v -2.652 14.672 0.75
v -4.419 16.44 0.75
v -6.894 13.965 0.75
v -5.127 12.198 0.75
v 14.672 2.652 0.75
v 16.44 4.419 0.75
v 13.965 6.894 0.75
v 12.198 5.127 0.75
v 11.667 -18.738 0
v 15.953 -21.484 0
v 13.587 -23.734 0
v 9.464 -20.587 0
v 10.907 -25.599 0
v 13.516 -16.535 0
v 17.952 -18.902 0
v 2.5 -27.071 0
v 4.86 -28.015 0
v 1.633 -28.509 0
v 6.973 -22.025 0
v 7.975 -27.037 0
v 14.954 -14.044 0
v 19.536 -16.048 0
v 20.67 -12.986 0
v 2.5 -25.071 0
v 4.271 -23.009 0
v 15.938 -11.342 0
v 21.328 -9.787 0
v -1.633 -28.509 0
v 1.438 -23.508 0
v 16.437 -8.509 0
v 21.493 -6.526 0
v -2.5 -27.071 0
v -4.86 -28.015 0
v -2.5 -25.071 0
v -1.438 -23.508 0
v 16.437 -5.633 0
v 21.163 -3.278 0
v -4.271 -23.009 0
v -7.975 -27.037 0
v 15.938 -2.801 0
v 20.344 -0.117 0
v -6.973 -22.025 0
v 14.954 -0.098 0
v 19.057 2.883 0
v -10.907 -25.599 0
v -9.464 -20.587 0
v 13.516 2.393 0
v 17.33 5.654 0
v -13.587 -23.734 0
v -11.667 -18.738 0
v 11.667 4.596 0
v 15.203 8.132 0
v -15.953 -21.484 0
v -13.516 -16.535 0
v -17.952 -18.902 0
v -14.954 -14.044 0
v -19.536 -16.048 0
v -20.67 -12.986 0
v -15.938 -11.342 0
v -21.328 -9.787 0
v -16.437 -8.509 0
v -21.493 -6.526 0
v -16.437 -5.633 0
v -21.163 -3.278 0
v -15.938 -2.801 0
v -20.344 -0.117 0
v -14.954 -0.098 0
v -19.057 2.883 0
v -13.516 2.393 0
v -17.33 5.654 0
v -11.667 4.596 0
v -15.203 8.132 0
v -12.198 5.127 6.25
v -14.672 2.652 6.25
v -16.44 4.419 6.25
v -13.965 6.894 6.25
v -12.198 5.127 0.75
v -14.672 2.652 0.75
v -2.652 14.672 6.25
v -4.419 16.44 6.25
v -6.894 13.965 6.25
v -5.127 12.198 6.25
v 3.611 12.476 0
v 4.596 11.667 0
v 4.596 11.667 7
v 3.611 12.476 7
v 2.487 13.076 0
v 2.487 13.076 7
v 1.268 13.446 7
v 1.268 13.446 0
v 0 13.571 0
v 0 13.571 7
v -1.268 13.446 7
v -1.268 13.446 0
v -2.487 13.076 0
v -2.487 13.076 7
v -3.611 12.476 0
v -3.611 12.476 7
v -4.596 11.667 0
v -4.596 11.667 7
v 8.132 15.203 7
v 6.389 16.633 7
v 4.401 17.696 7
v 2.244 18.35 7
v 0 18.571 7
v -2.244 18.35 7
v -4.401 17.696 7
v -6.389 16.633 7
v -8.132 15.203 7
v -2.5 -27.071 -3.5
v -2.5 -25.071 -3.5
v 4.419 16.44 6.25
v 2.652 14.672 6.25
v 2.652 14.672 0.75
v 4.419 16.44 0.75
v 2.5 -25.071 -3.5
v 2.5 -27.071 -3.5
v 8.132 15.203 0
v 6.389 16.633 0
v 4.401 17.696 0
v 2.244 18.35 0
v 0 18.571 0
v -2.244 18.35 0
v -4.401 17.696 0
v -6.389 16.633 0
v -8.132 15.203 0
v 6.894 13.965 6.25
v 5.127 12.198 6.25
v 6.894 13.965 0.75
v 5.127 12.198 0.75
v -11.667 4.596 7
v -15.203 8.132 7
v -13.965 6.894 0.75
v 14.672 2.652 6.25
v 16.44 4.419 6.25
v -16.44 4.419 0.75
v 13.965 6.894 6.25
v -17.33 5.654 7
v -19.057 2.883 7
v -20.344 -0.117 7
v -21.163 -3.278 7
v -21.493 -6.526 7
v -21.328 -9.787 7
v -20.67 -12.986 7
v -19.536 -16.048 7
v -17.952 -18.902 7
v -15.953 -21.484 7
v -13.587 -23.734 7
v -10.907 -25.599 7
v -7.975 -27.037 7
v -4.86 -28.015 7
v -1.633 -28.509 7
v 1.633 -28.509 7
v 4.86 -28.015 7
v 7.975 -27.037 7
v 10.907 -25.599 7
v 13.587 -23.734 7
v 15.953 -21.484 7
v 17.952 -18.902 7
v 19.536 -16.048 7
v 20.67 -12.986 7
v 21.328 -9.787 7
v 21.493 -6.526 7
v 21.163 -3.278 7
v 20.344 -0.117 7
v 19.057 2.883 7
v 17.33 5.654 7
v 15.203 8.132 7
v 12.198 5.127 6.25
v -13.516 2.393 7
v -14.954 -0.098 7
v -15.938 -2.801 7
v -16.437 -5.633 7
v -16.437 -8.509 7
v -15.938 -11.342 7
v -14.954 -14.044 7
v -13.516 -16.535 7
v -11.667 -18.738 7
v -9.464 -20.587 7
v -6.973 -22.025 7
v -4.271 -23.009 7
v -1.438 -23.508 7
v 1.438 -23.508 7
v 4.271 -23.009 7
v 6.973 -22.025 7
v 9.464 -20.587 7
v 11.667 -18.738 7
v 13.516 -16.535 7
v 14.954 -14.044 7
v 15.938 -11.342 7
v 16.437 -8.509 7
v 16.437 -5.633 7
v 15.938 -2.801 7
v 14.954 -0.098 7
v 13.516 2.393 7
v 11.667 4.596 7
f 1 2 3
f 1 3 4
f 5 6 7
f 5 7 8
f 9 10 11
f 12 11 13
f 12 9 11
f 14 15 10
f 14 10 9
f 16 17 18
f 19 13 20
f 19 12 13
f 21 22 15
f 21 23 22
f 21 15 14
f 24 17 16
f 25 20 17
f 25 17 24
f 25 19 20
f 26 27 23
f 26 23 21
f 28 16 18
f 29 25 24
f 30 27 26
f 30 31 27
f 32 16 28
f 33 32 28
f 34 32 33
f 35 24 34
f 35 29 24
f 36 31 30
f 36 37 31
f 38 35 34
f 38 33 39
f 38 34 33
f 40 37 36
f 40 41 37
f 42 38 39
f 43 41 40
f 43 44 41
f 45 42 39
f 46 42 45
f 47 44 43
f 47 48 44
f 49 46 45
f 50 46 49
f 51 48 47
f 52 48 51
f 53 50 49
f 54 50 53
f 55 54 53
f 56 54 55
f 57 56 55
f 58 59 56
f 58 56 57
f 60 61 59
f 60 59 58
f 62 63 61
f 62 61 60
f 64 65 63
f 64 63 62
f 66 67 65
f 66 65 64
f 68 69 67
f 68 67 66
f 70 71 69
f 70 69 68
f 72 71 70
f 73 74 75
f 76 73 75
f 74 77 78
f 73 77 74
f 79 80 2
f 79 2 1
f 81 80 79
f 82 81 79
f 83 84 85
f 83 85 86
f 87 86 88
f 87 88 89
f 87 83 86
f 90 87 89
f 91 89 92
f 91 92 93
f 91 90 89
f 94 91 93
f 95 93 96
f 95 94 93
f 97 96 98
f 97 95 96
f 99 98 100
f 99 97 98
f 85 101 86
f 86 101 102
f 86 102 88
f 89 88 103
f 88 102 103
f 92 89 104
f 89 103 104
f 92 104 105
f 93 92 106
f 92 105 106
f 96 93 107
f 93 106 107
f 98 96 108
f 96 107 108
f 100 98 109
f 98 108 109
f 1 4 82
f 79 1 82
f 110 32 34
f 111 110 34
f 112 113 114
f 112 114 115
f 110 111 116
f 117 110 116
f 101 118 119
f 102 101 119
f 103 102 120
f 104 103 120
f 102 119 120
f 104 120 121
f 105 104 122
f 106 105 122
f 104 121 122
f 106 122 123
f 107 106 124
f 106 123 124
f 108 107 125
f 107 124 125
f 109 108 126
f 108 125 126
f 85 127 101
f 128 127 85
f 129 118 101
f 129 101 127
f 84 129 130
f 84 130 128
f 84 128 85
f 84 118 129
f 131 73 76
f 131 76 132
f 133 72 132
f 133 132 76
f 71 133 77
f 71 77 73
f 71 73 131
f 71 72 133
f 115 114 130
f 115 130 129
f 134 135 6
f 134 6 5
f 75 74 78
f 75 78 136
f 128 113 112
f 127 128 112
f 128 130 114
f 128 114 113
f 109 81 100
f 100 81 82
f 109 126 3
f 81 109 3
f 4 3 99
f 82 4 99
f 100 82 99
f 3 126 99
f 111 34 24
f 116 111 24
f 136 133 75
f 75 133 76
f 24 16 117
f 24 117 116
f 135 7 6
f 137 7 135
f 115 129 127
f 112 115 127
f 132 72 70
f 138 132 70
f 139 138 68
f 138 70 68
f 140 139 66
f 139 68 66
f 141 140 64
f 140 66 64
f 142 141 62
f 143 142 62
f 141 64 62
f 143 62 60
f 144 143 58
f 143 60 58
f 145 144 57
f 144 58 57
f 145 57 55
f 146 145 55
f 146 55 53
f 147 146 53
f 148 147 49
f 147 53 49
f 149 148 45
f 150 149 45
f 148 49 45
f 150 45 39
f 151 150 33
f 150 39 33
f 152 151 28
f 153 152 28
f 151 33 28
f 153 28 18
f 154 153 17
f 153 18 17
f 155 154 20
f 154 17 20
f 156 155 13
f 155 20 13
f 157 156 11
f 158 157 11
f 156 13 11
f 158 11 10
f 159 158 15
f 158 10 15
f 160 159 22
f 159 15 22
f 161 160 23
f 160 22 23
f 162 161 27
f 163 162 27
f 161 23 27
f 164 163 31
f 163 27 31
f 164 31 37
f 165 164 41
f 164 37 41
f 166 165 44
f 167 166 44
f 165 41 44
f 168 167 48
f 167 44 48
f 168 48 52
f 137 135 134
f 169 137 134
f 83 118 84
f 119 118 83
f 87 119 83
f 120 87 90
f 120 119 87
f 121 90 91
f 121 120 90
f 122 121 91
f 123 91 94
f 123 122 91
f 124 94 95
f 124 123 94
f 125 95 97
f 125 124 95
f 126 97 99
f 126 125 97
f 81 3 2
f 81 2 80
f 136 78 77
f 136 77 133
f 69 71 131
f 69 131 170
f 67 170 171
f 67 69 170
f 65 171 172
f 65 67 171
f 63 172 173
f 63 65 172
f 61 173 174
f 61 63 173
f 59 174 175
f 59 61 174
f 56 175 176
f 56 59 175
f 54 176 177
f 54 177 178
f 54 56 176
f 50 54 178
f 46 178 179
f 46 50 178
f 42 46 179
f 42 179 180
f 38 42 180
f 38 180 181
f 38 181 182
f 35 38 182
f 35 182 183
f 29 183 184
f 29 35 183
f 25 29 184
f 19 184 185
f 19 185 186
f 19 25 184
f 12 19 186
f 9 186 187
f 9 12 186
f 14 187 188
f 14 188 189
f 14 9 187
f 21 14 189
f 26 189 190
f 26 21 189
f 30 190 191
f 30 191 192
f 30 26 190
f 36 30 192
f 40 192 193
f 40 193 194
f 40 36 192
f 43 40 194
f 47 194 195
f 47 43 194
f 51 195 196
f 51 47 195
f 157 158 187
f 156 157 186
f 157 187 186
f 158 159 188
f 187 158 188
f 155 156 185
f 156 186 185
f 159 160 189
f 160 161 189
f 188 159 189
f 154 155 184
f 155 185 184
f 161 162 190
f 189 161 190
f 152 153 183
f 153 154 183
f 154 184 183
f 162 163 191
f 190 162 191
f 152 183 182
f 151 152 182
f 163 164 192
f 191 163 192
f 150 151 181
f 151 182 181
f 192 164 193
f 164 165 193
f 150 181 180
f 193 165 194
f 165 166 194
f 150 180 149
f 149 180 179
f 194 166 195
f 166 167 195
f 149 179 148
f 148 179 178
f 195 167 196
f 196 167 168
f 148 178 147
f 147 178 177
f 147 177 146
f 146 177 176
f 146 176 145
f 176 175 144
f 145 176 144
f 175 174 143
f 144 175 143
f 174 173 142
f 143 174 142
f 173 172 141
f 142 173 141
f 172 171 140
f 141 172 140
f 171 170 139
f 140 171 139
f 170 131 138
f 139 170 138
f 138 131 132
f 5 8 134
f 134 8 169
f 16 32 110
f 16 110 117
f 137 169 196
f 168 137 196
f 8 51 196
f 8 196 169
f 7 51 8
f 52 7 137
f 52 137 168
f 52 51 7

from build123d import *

# Parameters (mm, degrees)
PAD_DEPTH       = 7
SKETCH003_W     = 2.5
SKETCH003_H     = 5.5
POCKET_DEPTH    = 3.5
SKETCH004_W     = 2.5
SKETCH004_H     = 5.5
POCKET001_DEPTH = 3.5
PAD001_DEPTH    = 7
SKETCH007_W     = 2.5
SKETCH007_H     = 5.5
POCKET002_DEPTH = 3.5
SKETCH008_W     = 2.5
SKETCH008_H     = 5.5
POCKET003_DEPTH = 3.5
SKETCH009_W     = 5
SKETCH009_H     = 2
PAD002_DEPTH    = 3.5


with BuildPart() as top:
    # Sketch → Pad (new body)
    with BuildSketch(Plane.XY):
        with BuildLine():
            Line((8.1317279832, 15.2027957954), (4.5961940776, 11.6672618892))
            ThreePointArc((4.5961940776, 11.6672618892), (0, 13.5710678493), (-4.5961940776, 11.6672618892))
            Line((-8.1317279832, 15.2027957954), (-4.5961940776, 11.6672618892))
            ThreePointArc((8.1317279832, 15.2027957954), (0, 18.5710678493), (-8.1317279832, 15.2027957954))
        make_face()
    extrude(amount=PAD_DEPTH)

    # Sketch003 (on Face2 of Pad) → Pocket (cut)
    with BuildSketch(Plane(origin=(-3.5355339055, 3.535533905, 0), x_dir=(0.7071067811, 0.7071067812, 0), z_dir=(0.7071067812, -0.7071067811, 0))):
        with Locations((13.5, 3.5)):
            Rectangle(SKETCH003_W, SKETCH003_H)
    extrude(amount=-POCKET_DEPTH, mode=Mode.SUBTRACT)

    # Sketch004 (on Face3 of Pocket) → Pocket001 (cut)
    with BuildSketch(Plane(origin=(3.5355339055, 3.535533905, 0), x_dir=(0.7071067811, -0.7071067812, 0), z_dir=(-0.7071067812, -0.7071067811, 0))):
        with Locations((-13.5, 3.5)):
            Rectangle(SKETCH004_W, SKETCH004_H)
    extrude(amount=-POCKET001_DEPTH, mode=Mode.SUBTRACT)


with BuildPart() as bottom:
    # Sketch006 → Pad001 (new body)
    with BuildSketch(Plane.XY):
        with BuildLine():
            ThreePointArc((-11.6672634162, 4.596194732), (0, -23.5710831296), (11.6672634162, 4.596194732))
            Line((11.6672634162, 4.596194732), (15.2027962317, 8.1317297284))
            ThreePointArc((-15.2027962317, 8.1317297284), (0, -28.5710831296), (15.2027962317, 8.1317297284))
            Line((-15.2027962317, 8.1317297284), (-11.6672634162, 4.596194732))
        make_face()
    extrude(amount=PAD001_DEPTH)

    # Sketch007 (on Face1 of Pad001) → Pocket002 (cut)
    with BuildSketch(Plane(origin=(-3.5355379407, -3.5355357597, 0), x_dir=(-0.7071065631, 0.7071069993, 0), z_dir=(0.7071069993, 0.7071065631, 0))):
        with Locations((13.5, 3.5)):
            Rectangle(SKETCH007_W, SKETCH007_H)
    extrude(amount=-POCKET002_DEPTH, mode=Mode.SUBTRACT)

    # Sketch008 (on Face10 of Pocket002) → Pocket003 (cut)
    with BuildSketch(Plane(origin=(3.5355379407, -3.5355357597, 0), x_dir=(-0.7071065631, -0.7071069993, 0), z_dir=(-0.7071069993, 0.7071065631, 0))):
        with Locations((-13.5, 3.5)):
            Rectangle(SKETCH008_W, SKETCH008_H)
    extrude(amount=-POCKET003_DEPTH, mode=Mode.SUBTRACT)

    # Sketch009 → Pad002 (join)
    with BuildSketch(Plane.XY):
        with Locations((0, -26.0710701628)):
            Rectangle(SKETCH009_W, SKETCH009_H)
    extrude(amount=-PAD002_DEPTH)


solid = Compound([top.part, bottom.part])
